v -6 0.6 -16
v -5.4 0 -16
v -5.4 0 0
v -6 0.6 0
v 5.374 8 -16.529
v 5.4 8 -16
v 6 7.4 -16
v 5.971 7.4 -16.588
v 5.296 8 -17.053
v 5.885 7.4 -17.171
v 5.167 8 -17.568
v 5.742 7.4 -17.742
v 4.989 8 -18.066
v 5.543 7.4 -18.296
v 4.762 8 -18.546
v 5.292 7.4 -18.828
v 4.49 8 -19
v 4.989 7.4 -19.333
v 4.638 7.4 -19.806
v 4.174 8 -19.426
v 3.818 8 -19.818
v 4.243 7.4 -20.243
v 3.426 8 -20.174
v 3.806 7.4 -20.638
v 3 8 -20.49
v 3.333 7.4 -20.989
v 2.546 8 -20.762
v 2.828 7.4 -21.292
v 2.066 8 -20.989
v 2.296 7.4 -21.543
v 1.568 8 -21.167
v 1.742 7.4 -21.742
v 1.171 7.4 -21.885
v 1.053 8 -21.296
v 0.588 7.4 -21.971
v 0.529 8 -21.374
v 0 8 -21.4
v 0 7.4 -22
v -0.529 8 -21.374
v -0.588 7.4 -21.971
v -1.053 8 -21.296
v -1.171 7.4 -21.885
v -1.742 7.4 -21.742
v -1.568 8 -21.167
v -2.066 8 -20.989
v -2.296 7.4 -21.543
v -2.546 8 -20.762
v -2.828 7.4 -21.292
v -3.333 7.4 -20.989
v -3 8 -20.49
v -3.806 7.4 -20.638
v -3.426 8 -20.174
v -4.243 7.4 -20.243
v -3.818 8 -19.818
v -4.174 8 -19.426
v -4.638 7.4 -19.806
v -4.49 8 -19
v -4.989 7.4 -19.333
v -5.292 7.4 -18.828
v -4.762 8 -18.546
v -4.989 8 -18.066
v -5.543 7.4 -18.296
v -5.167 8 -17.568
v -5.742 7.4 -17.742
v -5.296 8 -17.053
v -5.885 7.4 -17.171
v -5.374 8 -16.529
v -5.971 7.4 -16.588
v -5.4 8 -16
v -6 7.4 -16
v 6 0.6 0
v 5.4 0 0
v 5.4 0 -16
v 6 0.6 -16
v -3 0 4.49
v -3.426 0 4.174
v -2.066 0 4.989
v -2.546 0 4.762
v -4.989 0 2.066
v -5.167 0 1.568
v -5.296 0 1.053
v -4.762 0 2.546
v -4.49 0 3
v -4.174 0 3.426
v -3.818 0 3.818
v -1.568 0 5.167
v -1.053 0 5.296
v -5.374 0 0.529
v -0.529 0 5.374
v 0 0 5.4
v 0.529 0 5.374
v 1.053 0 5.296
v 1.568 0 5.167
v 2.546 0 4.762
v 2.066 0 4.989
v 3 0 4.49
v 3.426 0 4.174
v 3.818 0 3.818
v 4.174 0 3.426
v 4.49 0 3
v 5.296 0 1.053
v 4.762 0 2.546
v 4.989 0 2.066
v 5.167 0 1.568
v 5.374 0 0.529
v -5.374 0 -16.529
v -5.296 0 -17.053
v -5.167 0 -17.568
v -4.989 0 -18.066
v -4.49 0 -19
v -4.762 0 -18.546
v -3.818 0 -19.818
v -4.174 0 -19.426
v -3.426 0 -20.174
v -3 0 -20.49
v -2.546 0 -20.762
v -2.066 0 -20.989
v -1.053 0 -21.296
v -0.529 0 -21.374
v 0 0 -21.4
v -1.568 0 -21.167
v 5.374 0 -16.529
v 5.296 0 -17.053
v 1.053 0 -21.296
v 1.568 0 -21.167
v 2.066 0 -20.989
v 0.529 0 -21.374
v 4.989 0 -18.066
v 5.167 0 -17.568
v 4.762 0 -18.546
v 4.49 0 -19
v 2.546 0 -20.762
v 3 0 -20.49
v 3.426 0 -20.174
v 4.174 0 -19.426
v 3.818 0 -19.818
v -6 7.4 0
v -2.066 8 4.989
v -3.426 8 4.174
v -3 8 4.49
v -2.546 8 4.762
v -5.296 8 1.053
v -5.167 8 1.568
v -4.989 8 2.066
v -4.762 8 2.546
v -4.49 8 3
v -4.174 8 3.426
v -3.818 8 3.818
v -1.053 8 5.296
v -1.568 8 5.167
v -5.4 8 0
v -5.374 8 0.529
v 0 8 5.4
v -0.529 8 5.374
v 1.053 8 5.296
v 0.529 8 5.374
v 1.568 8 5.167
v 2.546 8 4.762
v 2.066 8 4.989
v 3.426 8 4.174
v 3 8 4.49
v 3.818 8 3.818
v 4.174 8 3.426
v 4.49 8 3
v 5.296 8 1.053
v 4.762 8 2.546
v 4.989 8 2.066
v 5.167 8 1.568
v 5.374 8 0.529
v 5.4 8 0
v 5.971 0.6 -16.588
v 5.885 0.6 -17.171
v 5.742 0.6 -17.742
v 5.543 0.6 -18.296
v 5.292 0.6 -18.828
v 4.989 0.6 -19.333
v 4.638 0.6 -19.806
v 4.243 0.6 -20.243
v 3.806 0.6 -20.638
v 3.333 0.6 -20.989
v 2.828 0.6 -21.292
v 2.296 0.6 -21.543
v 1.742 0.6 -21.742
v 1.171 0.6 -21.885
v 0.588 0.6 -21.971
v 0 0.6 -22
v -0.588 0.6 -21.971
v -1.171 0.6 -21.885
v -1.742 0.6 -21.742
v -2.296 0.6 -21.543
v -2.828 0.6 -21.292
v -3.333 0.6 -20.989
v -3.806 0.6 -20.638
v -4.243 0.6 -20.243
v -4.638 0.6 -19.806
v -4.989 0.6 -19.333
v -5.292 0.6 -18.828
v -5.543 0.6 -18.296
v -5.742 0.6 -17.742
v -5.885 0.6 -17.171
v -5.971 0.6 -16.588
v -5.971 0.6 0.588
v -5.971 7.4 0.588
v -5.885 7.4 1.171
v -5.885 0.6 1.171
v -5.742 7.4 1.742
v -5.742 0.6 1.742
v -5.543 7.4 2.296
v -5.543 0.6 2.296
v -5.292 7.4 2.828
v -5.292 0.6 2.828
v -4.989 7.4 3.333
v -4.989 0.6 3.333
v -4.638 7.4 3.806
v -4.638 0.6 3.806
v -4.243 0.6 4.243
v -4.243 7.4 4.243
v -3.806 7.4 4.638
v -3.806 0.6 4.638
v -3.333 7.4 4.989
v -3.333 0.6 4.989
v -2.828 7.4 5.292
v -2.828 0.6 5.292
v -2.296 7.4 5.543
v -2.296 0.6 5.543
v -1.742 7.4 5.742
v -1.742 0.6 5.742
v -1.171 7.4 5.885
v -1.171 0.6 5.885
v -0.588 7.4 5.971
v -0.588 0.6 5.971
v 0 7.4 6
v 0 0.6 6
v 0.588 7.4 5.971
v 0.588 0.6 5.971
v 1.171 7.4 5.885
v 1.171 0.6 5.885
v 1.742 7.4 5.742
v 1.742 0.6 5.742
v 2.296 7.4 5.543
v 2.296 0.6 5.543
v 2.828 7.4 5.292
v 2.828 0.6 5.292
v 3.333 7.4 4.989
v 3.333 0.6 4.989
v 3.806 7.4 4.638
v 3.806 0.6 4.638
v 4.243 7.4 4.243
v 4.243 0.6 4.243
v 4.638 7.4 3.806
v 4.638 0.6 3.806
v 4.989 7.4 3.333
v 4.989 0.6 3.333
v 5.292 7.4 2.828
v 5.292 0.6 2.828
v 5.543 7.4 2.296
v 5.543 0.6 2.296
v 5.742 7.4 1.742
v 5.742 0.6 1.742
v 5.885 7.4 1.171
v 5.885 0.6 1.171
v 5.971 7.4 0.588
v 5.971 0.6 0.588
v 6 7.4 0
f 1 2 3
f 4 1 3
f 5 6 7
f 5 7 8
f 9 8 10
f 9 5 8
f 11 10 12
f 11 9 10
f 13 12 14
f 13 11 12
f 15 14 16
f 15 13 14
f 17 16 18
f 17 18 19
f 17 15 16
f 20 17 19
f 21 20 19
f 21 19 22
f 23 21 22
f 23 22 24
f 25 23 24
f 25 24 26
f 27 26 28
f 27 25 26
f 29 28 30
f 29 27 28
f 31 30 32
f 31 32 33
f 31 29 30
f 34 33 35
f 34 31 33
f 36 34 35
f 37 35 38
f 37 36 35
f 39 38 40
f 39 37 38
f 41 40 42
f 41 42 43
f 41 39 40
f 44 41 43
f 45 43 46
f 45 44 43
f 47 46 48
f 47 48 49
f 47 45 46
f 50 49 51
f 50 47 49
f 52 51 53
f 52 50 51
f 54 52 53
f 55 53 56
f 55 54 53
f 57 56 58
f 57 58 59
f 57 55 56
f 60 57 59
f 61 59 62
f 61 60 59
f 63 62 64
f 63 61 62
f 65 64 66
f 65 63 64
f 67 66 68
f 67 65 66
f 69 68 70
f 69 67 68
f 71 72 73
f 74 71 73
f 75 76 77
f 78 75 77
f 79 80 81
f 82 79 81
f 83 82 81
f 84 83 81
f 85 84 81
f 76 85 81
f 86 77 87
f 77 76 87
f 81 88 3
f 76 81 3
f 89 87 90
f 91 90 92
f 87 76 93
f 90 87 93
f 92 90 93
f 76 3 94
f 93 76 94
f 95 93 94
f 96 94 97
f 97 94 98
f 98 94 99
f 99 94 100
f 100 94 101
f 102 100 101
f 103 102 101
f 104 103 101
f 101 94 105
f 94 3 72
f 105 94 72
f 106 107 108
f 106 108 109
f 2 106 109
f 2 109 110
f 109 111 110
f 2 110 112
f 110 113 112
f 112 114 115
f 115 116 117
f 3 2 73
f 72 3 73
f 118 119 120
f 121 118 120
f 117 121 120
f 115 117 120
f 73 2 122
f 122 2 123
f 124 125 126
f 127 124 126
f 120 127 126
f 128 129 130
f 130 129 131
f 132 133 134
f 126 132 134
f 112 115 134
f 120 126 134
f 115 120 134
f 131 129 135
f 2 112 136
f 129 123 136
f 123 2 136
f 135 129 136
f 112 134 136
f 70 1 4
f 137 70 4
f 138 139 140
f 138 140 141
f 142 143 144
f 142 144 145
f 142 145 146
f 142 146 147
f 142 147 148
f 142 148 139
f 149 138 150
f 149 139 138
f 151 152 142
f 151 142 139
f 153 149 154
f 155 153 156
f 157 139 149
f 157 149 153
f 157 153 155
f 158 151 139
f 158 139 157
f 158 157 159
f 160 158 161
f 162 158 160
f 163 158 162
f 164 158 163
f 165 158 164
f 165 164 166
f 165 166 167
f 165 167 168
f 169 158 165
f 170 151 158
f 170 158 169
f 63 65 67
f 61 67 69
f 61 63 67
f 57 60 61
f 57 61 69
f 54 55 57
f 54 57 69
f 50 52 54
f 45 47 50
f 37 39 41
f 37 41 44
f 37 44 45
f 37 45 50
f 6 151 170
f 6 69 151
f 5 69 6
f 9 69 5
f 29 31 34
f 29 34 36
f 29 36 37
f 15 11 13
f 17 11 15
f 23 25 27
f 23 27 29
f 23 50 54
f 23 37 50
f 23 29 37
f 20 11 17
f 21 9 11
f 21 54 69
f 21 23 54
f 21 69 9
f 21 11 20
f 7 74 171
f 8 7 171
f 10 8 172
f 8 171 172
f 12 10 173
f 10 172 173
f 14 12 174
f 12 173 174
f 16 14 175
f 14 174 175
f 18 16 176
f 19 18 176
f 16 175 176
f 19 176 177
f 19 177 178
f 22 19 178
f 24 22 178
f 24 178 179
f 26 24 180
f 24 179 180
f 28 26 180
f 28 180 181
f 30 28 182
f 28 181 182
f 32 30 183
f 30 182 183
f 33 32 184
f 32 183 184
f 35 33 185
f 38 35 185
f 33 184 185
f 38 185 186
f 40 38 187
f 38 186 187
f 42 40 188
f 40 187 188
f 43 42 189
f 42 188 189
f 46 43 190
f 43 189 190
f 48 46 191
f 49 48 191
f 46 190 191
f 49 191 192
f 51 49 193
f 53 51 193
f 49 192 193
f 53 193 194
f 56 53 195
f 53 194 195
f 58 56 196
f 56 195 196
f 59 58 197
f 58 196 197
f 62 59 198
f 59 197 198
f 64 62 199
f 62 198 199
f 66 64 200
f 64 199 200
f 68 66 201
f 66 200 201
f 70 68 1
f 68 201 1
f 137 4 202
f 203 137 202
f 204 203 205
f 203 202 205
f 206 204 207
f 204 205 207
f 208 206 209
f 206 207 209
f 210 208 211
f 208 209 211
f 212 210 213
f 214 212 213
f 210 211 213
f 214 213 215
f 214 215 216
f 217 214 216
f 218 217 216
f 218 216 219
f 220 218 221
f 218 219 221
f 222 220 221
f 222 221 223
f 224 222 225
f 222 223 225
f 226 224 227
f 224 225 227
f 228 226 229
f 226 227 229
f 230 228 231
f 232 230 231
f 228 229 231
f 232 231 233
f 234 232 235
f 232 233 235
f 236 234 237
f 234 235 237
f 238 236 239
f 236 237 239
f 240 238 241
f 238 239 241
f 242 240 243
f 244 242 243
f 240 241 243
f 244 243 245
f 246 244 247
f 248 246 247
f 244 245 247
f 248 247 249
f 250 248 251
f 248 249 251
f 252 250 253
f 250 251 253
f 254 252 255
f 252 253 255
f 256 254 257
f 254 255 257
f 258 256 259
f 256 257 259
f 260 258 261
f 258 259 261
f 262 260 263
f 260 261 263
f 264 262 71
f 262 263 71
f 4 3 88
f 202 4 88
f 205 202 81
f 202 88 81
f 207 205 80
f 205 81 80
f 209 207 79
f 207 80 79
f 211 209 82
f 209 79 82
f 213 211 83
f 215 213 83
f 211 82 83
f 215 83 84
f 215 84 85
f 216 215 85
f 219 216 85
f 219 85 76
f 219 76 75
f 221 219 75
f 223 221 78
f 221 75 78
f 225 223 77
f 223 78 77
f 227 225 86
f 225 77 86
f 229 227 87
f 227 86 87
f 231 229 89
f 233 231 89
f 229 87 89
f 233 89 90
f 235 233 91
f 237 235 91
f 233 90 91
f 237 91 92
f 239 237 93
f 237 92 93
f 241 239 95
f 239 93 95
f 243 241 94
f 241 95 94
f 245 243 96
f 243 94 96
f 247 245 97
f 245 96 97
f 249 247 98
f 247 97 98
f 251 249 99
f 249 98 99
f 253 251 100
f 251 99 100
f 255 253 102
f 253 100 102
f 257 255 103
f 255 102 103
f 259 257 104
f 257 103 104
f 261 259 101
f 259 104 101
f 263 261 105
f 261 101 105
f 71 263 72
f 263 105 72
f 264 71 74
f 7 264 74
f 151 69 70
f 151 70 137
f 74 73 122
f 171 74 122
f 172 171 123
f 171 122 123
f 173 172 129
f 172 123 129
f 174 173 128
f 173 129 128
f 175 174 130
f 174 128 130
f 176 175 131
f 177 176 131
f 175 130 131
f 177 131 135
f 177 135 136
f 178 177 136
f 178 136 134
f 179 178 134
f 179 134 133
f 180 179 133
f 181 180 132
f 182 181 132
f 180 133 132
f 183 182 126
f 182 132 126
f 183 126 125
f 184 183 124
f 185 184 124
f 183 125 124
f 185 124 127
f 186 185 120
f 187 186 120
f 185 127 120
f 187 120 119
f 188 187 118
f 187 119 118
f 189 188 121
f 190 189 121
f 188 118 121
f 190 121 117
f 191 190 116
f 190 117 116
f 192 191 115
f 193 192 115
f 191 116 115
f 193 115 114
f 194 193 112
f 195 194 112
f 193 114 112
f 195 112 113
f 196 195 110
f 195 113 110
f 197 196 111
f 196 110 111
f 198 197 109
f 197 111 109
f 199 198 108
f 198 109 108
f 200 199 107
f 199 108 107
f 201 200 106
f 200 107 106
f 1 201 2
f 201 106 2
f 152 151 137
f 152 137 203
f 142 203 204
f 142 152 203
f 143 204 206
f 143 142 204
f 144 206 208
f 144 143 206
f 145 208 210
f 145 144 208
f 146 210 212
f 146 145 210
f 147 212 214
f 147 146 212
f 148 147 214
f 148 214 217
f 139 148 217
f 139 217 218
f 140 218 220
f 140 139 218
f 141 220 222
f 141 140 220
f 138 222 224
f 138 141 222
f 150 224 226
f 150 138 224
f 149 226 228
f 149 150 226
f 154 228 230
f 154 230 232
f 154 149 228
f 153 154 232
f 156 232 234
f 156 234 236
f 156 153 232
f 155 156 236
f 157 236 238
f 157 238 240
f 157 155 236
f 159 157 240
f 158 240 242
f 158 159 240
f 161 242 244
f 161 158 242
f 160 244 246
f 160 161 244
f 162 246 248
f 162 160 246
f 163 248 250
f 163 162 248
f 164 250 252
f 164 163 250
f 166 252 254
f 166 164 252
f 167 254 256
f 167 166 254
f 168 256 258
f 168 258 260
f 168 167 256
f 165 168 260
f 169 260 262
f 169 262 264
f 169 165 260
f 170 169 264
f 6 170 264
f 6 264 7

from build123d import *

# Parameters (mm, degrees)
BOSS_EXTRUDE1_DEPTH = 8
CHAMFER1_SIZE       = 0.6


with BuildPart() as part:
    # Sketch1 → Boss-Extrude1 (new body)
    with BuildSketch(Plane(origin=(0, 0, 0), x_dir=(1, 0, 0), z_dir=(0, 1, 0))):
        with BuildLine():
            Line((6, 0), (6, 16))
            ThreePointArc((6, 16), (0, 22), (-6, 16))
            Line((-6, 16), (-6, 0))
            ThreePointArc((-6, 0), (0, -6), (6, 0))
        make_face()
    extrude(amount=BOSS_EXTRUDE1_DEPTH)

    # Chamfer1
    chamfer1_edges = [part.edges().sort_by_distance(p)[0] for p in [
        (0, 8, -22),
        (-6, 8, -8),
        (0, 8, 6),
        (-6, 0, -8),
        (0, 0, -22),
        (6, 0, -8),
        (0, 0, 6),
        (6, 8, -8),
    ]]
    chamfer(chamfer1_edges, length=CHAMFER1_SIZE)


solid = part.part
